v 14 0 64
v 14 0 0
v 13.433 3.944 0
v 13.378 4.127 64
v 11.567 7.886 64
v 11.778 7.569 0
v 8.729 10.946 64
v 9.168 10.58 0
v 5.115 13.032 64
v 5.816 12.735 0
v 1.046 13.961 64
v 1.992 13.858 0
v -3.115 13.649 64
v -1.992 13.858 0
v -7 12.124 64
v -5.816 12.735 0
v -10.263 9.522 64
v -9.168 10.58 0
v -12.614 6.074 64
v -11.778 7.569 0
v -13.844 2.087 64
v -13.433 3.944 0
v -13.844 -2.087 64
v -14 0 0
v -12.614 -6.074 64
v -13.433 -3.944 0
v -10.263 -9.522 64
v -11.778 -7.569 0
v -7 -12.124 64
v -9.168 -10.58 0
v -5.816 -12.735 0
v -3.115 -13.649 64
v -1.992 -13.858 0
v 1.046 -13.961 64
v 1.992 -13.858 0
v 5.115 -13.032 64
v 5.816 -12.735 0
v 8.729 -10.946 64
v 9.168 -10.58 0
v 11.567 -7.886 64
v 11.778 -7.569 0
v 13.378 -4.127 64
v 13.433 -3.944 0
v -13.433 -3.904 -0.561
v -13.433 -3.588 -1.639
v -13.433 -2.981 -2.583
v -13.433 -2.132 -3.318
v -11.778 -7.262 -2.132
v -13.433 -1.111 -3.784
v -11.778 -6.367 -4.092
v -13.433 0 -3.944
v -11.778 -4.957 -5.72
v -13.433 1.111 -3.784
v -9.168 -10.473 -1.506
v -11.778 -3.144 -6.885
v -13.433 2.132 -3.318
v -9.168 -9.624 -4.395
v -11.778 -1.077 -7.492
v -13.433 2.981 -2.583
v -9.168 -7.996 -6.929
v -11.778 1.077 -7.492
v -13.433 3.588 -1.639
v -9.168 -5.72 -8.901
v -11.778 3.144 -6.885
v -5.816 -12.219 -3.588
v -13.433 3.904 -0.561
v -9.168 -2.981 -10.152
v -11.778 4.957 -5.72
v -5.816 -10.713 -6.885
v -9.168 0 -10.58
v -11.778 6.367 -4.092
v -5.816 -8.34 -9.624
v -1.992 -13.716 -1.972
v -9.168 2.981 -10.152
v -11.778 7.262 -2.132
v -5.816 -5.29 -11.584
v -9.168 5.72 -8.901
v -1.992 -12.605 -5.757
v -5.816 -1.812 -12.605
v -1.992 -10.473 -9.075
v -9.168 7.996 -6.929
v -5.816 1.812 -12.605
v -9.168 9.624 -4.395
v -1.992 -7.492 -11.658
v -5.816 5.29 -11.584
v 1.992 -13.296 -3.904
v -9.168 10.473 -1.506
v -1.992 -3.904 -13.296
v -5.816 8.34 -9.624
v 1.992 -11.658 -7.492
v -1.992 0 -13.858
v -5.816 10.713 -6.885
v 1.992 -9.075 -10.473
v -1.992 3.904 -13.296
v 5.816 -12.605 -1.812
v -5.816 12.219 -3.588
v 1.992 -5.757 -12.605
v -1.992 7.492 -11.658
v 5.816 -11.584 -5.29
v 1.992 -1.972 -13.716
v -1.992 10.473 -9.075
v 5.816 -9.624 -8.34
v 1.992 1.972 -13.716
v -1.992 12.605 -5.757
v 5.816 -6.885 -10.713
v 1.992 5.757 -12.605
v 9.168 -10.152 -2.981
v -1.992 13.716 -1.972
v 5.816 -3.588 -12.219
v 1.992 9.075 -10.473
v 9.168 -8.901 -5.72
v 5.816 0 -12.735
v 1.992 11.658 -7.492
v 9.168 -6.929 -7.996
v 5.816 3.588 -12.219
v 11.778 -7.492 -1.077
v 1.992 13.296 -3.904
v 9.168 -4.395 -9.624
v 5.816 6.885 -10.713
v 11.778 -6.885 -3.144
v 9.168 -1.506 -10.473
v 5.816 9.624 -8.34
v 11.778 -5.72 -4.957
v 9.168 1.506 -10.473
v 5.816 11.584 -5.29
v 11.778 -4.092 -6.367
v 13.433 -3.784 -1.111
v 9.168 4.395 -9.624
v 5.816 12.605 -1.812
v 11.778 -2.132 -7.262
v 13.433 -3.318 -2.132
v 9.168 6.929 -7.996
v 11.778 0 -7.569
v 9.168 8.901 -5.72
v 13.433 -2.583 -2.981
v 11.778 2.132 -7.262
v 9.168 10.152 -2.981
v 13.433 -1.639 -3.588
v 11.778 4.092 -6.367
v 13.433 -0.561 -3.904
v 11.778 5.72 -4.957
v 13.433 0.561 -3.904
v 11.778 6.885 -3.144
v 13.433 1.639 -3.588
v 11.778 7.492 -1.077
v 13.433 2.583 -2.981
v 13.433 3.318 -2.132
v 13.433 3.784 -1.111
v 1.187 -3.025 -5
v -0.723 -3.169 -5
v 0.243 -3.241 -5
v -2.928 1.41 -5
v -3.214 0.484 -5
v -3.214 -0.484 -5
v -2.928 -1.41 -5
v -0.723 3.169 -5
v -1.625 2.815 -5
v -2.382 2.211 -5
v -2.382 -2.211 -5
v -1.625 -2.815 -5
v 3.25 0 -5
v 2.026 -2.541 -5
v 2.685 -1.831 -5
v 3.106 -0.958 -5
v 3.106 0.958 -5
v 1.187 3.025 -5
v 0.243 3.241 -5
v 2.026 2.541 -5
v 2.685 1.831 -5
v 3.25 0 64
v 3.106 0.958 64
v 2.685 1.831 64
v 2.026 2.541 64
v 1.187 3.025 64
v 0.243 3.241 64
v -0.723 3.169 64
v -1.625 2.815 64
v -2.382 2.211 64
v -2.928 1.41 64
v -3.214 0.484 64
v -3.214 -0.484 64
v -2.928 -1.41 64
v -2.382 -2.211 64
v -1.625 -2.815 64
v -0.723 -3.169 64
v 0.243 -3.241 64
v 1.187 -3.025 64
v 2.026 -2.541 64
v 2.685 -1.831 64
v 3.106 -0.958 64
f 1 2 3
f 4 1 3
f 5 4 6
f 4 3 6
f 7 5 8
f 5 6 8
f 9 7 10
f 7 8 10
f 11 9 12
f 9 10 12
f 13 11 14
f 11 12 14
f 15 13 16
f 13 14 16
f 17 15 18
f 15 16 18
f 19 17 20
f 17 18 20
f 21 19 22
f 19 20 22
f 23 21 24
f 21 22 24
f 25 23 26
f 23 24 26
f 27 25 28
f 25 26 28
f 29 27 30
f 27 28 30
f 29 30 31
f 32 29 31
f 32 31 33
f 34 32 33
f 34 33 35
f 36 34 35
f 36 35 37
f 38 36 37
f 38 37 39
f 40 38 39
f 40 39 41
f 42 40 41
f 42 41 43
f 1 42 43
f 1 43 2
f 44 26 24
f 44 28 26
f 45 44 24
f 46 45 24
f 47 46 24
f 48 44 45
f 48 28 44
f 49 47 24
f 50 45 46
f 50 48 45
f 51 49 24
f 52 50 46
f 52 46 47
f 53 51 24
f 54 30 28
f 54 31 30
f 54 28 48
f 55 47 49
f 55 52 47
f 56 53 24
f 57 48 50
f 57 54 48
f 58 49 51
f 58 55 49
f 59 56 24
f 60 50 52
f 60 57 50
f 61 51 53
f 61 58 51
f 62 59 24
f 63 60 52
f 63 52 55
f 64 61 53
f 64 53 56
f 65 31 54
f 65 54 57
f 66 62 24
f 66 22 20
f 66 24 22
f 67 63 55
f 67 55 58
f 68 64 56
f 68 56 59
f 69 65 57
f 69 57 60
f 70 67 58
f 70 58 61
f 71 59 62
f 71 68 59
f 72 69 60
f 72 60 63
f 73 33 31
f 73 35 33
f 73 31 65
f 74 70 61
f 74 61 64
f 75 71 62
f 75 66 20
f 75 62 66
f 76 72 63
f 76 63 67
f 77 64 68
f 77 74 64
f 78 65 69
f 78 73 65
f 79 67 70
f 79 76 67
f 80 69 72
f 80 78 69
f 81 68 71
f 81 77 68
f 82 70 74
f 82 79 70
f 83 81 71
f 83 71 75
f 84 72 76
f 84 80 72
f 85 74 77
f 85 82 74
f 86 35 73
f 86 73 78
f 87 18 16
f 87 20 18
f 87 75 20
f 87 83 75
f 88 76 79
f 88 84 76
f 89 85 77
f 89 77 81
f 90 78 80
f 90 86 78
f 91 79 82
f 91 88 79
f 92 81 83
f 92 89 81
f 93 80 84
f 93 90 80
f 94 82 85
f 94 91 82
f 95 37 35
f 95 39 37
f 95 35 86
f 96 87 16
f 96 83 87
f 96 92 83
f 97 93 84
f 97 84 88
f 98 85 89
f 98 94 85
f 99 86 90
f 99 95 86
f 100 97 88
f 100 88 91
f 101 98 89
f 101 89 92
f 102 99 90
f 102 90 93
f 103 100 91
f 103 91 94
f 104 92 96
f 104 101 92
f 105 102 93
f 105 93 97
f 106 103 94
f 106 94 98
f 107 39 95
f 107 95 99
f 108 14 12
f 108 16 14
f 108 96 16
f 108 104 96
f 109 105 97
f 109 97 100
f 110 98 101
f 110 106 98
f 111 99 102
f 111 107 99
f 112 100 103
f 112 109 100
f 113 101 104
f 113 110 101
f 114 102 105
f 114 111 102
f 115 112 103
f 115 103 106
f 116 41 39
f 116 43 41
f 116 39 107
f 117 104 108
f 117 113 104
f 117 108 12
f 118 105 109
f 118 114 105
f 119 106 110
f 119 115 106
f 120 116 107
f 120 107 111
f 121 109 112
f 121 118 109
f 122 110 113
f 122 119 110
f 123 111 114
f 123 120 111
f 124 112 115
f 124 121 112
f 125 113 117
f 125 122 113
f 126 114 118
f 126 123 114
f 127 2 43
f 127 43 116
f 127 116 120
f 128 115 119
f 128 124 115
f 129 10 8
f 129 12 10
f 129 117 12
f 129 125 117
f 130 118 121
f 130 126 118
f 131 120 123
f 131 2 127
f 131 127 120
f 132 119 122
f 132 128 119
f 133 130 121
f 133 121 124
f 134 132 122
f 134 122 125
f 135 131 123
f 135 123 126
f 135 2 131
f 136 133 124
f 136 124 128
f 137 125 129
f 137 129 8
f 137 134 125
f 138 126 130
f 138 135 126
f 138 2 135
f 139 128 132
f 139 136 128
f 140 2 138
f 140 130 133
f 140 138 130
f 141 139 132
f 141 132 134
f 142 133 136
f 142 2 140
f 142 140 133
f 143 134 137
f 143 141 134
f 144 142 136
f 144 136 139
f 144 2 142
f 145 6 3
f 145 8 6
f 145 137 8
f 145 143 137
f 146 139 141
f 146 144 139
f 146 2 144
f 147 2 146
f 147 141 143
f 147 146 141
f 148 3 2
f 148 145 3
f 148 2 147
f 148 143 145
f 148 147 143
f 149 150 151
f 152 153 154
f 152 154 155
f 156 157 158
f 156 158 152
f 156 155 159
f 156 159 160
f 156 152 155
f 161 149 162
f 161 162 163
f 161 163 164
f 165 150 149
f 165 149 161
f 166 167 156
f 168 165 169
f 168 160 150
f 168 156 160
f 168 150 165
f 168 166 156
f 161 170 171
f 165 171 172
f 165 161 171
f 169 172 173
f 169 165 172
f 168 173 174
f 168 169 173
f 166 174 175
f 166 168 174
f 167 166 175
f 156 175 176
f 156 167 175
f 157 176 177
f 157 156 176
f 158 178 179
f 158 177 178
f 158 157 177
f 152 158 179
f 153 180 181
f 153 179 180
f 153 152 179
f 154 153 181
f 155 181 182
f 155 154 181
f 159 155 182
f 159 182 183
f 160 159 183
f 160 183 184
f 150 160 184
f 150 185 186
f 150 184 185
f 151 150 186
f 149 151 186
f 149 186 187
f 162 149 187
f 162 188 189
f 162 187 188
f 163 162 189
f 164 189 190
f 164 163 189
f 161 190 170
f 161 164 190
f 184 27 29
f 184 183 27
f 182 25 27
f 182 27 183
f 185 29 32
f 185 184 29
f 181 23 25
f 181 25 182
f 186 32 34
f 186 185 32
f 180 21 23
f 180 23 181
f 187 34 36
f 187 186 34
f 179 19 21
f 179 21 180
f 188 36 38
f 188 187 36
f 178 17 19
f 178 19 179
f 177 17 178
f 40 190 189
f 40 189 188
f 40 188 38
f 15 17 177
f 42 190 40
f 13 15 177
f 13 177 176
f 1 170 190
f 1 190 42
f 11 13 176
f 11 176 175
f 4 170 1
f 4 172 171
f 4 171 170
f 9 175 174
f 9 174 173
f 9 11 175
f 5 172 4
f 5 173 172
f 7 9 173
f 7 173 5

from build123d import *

# Parameters (mm, degrees)
F0_R     = 14
F1_DEPTH = 64
F6_R     = 3.25
F7_DEPTH = 69.14147


# Not quite as in the source:
# - a feature of the source that left no trace in its solid (it failed there, or was rolled back) is left out


with BuildPart() as f1:
    # F0 (on Top) → F1 (new body)
    with BuildSketch(Plane.XY):
        Circle(F0_R)
    extrude(amount=F1_DEPTH)

    # F2 (on Front) → F3 (revolve)
    with BuildSketch(Plane.XZ):
        with BuildLine():
            Line((0, 0), (-14, 0))
            ThreePointArc((-14, 0), (0, -14), (14, 0))
            Line((14, 0), (0, 0))
        make_face()
    revolve(axis=Axis((0, 0, 0), (1, 0, 0)))

    # F6 (on offset) → F7 (cut)
    with BuildSketch(Plane.XY.offset(-5)):
        Circle(F6_R)
    extrude(amount=F7_DEPTH, mode=Mode.SUBTRACT)


solid = f1.part
